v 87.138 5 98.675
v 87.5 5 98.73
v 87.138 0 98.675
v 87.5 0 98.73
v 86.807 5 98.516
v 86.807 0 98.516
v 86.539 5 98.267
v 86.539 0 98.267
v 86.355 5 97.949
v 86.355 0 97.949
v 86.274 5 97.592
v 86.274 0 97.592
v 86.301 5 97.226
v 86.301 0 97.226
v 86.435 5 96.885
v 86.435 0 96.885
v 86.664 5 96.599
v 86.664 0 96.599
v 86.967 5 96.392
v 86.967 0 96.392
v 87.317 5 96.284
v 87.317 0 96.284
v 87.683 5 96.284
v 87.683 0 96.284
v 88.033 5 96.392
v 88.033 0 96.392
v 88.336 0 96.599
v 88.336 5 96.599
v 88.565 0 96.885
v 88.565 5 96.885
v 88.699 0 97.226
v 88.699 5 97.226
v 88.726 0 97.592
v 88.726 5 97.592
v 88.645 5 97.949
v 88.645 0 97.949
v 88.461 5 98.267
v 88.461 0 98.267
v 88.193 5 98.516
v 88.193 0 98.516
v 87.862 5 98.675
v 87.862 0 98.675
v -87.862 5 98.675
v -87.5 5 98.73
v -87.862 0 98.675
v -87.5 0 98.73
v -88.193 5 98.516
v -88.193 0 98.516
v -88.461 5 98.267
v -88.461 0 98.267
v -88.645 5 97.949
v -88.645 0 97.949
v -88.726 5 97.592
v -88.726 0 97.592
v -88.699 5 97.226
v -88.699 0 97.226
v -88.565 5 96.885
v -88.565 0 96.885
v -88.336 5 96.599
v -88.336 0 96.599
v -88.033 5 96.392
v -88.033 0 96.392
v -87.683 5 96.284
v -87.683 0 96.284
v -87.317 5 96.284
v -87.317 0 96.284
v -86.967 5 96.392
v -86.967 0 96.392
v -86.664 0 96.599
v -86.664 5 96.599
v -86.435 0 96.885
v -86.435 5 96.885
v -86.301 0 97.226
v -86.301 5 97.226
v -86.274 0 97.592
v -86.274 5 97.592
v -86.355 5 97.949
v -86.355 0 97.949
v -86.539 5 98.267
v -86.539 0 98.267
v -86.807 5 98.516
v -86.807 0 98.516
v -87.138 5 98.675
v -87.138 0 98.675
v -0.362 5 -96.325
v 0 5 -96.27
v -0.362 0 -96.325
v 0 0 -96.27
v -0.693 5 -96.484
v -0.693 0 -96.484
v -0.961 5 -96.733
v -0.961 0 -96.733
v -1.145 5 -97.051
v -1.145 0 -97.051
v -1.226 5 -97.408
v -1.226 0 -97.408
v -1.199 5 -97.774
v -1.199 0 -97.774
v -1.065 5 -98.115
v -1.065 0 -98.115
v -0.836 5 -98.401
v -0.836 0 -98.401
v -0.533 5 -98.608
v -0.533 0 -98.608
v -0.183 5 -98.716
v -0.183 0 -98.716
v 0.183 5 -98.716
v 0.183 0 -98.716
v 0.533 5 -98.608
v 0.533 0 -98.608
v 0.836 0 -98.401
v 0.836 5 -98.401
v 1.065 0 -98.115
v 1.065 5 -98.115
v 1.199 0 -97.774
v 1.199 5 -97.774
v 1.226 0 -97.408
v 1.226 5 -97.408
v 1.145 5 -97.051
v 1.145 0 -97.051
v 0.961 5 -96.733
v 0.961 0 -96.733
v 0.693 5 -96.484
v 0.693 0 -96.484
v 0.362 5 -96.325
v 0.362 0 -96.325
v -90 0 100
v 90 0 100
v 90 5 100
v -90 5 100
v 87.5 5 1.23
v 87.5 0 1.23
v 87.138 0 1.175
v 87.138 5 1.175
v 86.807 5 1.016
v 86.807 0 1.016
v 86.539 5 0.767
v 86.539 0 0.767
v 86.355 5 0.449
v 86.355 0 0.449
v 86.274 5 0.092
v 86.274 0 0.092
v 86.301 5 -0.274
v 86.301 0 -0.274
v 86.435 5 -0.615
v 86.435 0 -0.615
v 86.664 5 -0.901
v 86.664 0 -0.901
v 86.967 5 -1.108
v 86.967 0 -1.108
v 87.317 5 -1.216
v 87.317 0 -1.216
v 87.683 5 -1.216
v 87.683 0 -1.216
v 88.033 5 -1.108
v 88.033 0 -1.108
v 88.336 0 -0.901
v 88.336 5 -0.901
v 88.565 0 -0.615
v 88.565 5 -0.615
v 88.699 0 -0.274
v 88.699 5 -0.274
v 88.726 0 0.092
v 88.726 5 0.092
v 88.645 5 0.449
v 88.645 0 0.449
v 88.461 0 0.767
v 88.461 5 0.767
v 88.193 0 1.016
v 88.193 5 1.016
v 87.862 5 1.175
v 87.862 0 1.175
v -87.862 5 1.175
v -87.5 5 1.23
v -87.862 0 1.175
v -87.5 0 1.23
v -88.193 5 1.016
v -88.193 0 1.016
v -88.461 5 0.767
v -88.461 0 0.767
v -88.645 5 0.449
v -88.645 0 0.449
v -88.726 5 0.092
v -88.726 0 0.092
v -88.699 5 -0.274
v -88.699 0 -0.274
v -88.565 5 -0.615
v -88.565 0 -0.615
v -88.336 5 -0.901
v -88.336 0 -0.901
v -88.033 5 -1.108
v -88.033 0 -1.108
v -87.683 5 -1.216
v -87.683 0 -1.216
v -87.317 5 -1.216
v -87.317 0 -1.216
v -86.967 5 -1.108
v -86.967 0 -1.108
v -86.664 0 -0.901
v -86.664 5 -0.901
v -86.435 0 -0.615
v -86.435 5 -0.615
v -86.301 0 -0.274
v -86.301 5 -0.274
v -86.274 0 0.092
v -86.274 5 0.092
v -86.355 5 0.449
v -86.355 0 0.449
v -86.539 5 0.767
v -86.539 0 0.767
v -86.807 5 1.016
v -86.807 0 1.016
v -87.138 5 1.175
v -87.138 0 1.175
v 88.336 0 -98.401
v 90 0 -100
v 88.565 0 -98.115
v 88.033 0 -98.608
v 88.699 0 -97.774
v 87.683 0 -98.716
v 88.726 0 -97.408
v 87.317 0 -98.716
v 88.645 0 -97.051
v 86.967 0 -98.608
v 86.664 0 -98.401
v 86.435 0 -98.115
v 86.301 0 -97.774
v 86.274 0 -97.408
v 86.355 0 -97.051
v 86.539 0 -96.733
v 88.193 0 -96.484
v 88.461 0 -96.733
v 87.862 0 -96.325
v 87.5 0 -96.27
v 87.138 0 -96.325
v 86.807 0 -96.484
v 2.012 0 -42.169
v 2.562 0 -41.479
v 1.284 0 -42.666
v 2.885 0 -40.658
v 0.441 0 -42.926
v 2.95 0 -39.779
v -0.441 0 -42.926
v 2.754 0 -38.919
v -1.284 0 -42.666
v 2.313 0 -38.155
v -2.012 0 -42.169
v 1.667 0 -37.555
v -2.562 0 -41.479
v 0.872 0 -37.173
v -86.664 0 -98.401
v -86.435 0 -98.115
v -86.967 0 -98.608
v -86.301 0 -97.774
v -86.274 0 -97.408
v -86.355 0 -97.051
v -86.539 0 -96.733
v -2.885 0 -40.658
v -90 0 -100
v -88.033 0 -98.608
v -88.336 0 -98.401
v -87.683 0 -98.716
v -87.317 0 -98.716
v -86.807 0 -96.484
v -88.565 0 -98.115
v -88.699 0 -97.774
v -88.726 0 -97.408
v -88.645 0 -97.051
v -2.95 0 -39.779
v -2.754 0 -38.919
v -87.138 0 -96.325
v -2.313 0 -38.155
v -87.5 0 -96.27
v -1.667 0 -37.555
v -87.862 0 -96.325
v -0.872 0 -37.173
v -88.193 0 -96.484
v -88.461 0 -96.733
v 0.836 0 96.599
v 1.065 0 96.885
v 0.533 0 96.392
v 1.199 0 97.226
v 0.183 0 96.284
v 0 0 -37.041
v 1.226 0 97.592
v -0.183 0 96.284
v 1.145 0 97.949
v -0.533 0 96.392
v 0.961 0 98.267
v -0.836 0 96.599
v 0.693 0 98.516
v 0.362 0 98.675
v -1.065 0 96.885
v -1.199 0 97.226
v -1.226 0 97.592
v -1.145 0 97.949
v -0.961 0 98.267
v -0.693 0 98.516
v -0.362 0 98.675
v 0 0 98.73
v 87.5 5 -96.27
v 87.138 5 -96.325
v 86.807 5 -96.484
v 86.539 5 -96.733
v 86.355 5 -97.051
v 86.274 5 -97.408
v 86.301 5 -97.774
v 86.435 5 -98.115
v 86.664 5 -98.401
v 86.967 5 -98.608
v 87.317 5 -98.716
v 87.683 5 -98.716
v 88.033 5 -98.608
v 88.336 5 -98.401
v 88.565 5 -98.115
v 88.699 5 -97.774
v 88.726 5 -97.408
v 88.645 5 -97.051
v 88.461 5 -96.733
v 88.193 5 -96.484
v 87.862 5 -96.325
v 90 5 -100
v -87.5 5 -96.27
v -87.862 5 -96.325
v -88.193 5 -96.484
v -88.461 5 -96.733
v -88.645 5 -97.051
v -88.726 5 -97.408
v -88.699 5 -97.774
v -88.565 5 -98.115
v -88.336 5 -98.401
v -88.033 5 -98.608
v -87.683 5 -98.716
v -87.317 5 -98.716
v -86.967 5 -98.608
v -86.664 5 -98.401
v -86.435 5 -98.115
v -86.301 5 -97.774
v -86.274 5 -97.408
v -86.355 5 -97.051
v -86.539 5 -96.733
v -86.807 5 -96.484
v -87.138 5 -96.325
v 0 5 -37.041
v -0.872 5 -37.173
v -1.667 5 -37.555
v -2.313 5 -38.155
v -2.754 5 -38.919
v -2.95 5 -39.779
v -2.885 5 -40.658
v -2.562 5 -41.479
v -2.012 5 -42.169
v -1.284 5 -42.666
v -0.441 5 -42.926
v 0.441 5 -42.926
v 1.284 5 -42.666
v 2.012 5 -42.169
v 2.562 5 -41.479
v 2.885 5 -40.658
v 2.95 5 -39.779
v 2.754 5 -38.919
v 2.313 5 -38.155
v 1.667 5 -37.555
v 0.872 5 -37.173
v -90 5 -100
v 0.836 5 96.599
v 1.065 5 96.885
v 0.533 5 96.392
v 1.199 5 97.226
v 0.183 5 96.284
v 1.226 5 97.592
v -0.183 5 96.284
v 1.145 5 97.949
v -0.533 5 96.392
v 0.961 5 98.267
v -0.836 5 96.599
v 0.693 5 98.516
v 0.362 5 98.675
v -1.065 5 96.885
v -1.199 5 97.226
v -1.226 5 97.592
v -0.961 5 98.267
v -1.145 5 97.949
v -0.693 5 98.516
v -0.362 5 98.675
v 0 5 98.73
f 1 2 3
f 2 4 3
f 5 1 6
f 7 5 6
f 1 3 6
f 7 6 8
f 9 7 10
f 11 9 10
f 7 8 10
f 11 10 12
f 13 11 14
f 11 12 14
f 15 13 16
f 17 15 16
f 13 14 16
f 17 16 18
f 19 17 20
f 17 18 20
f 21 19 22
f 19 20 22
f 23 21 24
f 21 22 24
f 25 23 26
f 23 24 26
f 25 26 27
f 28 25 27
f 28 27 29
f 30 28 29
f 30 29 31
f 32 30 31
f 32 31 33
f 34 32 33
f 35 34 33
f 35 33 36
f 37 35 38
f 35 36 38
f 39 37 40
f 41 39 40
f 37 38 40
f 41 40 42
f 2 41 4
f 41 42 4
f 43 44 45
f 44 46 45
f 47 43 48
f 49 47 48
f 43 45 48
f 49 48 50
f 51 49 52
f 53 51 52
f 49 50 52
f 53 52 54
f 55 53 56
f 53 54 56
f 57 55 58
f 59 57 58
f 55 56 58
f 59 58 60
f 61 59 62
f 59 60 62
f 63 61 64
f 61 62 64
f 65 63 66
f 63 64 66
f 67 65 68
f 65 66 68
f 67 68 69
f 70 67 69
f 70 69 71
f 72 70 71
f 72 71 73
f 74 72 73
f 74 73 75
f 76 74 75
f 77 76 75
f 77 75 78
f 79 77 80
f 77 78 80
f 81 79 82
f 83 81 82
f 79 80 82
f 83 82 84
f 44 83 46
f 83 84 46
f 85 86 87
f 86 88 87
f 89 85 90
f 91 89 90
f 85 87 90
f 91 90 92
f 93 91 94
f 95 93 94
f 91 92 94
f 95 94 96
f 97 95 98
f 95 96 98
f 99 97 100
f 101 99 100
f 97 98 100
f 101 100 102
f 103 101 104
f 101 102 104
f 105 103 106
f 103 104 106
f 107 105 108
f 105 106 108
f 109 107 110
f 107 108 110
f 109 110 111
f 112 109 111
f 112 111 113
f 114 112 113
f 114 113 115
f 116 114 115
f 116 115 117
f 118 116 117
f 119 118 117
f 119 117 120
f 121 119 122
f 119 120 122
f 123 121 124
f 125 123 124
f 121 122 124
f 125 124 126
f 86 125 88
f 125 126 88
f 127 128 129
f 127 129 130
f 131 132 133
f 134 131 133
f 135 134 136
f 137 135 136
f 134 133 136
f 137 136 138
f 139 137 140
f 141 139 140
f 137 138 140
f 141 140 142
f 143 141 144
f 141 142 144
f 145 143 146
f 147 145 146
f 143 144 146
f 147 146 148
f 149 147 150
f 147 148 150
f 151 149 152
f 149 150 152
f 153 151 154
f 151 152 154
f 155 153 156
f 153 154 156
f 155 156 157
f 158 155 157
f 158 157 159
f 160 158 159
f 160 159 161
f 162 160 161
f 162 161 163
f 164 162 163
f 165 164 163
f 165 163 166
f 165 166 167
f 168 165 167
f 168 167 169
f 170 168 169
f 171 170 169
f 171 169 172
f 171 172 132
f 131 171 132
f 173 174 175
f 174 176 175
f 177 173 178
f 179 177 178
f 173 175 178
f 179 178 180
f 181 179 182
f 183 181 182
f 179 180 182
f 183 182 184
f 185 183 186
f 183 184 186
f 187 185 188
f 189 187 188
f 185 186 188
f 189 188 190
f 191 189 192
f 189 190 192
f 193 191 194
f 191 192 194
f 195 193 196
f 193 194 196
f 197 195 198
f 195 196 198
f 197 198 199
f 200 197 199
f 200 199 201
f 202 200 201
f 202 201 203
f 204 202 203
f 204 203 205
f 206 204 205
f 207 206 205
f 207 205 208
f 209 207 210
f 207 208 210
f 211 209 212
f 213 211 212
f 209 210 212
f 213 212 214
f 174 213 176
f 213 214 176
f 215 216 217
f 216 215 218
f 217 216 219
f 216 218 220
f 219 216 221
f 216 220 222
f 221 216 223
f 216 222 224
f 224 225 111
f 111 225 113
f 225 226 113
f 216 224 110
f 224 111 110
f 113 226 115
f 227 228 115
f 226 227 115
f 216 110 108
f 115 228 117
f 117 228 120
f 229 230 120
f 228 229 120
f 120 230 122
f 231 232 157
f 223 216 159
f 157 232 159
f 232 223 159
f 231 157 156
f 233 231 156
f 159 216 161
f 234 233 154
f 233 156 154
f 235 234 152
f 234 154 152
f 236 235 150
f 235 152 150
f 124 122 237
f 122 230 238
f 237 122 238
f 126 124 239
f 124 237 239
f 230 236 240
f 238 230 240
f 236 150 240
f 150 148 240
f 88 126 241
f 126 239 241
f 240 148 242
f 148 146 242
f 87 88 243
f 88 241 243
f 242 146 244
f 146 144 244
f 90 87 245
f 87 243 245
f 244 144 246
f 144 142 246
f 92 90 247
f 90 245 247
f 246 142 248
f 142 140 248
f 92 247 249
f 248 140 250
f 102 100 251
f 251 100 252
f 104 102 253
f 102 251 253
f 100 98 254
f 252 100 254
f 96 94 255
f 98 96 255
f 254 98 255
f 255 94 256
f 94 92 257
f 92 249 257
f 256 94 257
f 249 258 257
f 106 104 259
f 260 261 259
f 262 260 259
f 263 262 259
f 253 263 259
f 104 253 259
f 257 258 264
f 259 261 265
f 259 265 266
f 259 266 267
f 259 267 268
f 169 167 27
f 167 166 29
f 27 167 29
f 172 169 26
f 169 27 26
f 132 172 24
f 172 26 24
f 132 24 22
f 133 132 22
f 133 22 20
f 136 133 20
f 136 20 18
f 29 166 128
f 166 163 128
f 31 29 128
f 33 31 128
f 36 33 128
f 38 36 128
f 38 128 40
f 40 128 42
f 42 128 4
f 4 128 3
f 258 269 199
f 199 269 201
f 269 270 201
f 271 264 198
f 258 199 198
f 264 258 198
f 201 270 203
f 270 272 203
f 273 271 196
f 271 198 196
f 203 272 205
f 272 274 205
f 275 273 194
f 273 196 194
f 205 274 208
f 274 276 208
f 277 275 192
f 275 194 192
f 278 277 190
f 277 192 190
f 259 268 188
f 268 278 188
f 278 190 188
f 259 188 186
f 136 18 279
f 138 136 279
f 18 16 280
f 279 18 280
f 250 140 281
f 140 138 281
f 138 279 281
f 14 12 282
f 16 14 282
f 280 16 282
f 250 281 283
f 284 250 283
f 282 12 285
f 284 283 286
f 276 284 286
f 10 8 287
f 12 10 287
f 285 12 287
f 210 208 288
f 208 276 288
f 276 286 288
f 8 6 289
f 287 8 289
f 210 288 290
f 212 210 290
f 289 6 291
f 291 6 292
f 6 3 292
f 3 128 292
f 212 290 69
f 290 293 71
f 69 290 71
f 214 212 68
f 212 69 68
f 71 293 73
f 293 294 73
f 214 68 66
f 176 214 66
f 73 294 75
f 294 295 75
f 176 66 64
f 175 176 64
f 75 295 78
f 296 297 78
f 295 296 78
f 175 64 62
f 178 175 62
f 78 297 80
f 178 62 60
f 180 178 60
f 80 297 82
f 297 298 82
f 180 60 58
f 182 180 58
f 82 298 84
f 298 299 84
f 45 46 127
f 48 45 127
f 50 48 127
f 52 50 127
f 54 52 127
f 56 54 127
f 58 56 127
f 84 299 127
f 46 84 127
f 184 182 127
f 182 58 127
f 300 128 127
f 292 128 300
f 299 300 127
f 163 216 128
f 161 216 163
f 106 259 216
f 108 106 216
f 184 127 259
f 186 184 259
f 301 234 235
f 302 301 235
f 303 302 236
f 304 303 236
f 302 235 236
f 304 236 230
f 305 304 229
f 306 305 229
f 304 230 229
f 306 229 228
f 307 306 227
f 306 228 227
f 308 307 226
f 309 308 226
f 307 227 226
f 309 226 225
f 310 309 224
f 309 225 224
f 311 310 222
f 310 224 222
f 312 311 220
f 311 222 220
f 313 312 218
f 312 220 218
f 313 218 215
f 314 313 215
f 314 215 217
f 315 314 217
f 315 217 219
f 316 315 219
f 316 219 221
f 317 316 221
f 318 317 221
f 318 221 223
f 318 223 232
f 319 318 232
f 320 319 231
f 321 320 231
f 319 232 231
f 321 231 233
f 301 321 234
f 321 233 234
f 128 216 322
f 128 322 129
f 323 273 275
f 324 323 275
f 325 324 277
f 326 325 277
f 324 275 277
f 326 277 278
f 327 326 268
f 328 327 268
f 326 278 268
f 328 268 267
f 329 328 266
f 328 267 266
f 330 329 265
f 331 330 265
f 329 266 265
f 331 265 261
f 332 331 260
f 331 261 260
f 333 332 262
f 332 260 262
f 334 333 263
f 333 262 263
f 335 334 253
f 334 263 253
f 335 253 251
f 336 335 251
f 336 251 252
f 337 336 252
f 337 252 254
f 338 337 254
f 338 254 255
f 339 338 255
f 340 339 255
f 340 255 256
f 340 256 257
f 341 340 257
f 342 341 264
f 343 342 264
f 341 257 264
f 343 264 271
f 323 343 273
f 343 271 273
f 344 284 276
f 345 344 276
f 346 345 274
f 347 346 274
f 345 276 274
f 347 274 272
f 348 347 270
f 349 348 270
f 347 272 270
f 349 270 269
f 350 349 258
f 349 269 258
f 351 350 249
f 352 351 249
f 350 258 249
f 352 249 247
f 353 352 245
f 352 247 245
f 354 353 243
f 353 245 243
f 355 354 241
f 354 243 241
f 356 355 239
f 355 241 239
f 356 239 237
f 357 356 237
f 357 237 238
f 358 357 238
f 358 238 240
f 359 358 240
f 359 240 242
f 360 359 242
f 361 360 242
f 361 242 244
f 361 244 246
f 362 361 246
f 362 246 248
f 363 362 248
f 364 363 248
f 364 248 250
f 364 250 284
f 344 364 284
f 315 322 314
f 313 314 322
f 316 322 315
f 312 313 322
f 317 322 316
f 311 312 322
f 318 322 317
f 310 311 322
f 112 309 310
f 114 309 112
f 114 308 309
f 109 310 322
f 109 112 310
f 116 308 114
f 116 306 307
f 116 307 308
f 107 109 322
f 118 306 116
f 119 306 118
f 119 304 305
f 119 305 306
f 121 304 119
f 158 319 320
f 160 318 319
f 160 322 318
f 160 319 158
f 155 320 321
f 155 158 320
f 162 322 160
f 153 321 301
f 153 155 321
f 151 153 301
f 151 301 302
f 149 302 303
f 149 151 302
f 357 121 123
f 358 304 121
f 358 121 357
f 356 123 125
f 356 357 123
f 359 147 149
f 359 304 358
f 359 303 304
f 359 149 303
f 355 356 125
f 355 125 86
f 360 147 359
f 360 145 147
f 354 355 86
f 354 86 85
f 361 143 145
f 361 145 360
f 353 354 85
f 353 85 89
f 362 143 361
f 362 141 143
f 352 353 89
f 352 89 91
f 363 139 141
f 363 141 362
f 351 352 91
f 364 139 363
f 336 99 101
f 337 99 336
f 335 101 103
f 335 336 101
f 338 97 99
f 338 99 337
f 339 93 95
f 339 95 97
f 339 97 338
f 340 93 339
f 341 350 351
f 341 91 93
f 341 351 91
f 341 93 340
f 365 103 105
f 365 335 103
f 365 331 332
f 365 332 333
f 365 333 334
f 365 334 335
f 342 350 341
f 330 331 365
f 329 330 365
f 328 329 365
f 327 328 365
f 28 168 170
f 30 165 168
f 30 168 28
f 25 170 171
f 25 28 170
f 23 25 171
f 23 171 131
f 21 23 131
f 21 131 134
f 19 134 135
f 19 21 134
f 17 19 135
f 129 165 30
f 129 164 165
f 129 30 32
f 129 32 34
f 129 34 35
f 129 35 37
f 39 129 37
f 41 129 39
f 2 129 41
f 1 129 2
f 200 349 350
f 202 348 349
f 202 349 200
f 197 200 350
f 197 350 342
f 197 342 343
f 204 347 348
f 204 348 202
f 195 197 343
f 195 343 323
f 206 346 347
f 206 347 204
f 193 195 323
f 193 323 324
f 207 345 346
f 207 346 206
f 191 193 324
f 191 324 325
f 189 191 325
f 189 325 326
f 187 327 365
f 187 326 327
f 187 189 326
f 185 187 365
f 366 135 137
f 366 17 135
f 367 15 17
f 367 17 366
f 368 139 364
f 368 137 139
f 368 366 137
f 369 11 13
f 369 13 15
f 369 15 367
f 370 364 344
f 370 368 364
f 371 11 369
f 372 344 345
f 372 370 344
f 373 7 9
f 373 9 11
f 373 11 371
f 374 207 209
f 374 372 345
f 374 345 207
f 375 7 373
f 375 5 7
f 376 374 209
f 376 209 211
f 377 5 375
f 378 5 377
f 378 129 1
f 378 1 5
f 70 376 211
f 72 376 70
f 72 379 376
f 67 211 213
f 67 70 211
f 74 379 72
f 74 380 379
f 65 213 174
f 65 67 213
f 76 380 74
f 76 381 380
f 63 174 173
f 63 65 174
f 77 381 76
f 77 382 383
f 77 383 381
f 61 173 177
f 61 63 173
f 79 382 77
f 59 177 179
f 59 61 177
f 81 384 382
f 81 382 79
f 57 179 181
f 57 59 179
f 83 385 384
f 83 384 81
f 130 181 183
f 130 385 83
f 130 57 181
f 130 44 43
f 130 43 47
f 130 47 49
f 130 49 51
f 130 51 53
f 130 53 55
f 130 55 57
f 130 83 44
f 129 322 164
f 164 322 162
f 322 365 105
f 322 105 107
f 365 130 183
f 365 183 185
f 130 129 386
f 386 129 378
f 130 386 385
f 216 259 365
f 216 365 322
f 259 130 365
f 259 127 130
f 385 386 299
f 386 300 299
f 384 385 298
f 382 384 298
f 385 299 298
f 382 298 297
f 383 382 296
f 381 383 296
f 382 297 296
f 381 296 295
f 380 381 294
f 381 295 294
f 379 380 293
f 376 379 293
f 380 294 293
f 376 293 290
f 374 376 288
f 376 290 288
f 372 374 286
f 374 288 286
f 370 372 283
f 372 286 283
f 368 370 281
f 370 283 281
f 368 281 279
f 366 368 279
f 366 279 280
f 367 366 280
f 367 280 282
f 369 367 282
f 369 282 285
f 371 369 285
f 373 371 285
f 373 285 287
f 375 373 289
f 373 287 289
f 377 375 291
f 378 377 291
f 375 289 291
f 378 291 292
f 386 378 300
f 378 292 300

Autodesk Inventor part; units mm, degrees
ref_plane "YZ Plane" through (0, 0, 0) normal (1, 0, 0) x (0, 1, 0)
ref_plane "XZ Plane" through (0, 0, 0) normal (0, 1, 0) x (-1, 0, 0)
ref_plane "XY Plane" through (0, 0, 0) normal (0, 0, 1) x (1, 0, 0)
sketch "Esquisse1" plane through (0, 0, 0) normal (0, 1, 0) x (-1, 0, 0)
  line L0 (-90, 100) -> (90, 100)
  line L1 (90, 100) -> (90, -100)
  line L2 (90, -100) -> (-90, -100)
  line L3 (-90, -100) -> (-90, 100)
  line L4 (-90, 100) -> (90, -100) construction
  line L5 (90, 100) -> (-90, -100) construction
  point P0 (0, 0)
  dimension "d0" = 180
  dimension "d1" = 200
extrude "Extrusion1" add sketch "Esquisse1" along normal blind 5
sketch "Esquisse2" plane through (0, 5, 0) normal (0, 1, 0) x (1, 0, 0)
  line L0 (0, 0) -> (0, -97.5)
  line L1 (0, -97.5) -> (-87.5, -97.5)
  line L2 (0, 0) -> (-32.0024, 0)
  point P0 (87.5, -97.5)
  point P1 (-87.5, 97.5)
  point P2 (87.5, 97.5)
  dimension "d4" = 97.5
  dimension "d5" = 87.5
hole "Perçage1" at (-87.5, 5, 97.5) at (87.5, 5, 97.5) at (-87.5, 5, -97.5) at (87.5, 5, -97.5) direction (0, -1, 0) diameter 2.459 end through all thread size "M3x0.5" class "6H" standard "ISO Metric profile"
sketch "Esquisse3" plane through (0, 5, 0) normal (0, 1, 0) x (1, 0, 0)
  line L0 (0, 0) -> (-87.5, 0)
  line L1 (0, 0) -> (0, 97.5)
  point P0 (87.5, 0)
  point P1 (0, -97.5)
  dimension "d13" = 87.5
  dimension "d14" = 97.5
hole "Perçage2" at (-87.5, 5, 0) at (0, 5, -97.5) at (87.5, 5, 0) at (0, 5, 97.5) direction (0, -1, 0) diameter 2.459 end through all thread size "M3x0.5" class "6H" standard "ISO Metric profile"
sketch "Esquisse4" plane through (0, 5, 0) normal (0, 1, 0) x (1, 0, 0)
  line L0 (0, 0) -> (0, 40)
  dimension "d22" = 40
hole "Perçage3" at (0, 5, -40) direction (0, -1, 0) diameter 5.9175 end through all thread size "M7x1" class "6H" standard "ISO Metric profile"
properties part number "chassis_haut"
